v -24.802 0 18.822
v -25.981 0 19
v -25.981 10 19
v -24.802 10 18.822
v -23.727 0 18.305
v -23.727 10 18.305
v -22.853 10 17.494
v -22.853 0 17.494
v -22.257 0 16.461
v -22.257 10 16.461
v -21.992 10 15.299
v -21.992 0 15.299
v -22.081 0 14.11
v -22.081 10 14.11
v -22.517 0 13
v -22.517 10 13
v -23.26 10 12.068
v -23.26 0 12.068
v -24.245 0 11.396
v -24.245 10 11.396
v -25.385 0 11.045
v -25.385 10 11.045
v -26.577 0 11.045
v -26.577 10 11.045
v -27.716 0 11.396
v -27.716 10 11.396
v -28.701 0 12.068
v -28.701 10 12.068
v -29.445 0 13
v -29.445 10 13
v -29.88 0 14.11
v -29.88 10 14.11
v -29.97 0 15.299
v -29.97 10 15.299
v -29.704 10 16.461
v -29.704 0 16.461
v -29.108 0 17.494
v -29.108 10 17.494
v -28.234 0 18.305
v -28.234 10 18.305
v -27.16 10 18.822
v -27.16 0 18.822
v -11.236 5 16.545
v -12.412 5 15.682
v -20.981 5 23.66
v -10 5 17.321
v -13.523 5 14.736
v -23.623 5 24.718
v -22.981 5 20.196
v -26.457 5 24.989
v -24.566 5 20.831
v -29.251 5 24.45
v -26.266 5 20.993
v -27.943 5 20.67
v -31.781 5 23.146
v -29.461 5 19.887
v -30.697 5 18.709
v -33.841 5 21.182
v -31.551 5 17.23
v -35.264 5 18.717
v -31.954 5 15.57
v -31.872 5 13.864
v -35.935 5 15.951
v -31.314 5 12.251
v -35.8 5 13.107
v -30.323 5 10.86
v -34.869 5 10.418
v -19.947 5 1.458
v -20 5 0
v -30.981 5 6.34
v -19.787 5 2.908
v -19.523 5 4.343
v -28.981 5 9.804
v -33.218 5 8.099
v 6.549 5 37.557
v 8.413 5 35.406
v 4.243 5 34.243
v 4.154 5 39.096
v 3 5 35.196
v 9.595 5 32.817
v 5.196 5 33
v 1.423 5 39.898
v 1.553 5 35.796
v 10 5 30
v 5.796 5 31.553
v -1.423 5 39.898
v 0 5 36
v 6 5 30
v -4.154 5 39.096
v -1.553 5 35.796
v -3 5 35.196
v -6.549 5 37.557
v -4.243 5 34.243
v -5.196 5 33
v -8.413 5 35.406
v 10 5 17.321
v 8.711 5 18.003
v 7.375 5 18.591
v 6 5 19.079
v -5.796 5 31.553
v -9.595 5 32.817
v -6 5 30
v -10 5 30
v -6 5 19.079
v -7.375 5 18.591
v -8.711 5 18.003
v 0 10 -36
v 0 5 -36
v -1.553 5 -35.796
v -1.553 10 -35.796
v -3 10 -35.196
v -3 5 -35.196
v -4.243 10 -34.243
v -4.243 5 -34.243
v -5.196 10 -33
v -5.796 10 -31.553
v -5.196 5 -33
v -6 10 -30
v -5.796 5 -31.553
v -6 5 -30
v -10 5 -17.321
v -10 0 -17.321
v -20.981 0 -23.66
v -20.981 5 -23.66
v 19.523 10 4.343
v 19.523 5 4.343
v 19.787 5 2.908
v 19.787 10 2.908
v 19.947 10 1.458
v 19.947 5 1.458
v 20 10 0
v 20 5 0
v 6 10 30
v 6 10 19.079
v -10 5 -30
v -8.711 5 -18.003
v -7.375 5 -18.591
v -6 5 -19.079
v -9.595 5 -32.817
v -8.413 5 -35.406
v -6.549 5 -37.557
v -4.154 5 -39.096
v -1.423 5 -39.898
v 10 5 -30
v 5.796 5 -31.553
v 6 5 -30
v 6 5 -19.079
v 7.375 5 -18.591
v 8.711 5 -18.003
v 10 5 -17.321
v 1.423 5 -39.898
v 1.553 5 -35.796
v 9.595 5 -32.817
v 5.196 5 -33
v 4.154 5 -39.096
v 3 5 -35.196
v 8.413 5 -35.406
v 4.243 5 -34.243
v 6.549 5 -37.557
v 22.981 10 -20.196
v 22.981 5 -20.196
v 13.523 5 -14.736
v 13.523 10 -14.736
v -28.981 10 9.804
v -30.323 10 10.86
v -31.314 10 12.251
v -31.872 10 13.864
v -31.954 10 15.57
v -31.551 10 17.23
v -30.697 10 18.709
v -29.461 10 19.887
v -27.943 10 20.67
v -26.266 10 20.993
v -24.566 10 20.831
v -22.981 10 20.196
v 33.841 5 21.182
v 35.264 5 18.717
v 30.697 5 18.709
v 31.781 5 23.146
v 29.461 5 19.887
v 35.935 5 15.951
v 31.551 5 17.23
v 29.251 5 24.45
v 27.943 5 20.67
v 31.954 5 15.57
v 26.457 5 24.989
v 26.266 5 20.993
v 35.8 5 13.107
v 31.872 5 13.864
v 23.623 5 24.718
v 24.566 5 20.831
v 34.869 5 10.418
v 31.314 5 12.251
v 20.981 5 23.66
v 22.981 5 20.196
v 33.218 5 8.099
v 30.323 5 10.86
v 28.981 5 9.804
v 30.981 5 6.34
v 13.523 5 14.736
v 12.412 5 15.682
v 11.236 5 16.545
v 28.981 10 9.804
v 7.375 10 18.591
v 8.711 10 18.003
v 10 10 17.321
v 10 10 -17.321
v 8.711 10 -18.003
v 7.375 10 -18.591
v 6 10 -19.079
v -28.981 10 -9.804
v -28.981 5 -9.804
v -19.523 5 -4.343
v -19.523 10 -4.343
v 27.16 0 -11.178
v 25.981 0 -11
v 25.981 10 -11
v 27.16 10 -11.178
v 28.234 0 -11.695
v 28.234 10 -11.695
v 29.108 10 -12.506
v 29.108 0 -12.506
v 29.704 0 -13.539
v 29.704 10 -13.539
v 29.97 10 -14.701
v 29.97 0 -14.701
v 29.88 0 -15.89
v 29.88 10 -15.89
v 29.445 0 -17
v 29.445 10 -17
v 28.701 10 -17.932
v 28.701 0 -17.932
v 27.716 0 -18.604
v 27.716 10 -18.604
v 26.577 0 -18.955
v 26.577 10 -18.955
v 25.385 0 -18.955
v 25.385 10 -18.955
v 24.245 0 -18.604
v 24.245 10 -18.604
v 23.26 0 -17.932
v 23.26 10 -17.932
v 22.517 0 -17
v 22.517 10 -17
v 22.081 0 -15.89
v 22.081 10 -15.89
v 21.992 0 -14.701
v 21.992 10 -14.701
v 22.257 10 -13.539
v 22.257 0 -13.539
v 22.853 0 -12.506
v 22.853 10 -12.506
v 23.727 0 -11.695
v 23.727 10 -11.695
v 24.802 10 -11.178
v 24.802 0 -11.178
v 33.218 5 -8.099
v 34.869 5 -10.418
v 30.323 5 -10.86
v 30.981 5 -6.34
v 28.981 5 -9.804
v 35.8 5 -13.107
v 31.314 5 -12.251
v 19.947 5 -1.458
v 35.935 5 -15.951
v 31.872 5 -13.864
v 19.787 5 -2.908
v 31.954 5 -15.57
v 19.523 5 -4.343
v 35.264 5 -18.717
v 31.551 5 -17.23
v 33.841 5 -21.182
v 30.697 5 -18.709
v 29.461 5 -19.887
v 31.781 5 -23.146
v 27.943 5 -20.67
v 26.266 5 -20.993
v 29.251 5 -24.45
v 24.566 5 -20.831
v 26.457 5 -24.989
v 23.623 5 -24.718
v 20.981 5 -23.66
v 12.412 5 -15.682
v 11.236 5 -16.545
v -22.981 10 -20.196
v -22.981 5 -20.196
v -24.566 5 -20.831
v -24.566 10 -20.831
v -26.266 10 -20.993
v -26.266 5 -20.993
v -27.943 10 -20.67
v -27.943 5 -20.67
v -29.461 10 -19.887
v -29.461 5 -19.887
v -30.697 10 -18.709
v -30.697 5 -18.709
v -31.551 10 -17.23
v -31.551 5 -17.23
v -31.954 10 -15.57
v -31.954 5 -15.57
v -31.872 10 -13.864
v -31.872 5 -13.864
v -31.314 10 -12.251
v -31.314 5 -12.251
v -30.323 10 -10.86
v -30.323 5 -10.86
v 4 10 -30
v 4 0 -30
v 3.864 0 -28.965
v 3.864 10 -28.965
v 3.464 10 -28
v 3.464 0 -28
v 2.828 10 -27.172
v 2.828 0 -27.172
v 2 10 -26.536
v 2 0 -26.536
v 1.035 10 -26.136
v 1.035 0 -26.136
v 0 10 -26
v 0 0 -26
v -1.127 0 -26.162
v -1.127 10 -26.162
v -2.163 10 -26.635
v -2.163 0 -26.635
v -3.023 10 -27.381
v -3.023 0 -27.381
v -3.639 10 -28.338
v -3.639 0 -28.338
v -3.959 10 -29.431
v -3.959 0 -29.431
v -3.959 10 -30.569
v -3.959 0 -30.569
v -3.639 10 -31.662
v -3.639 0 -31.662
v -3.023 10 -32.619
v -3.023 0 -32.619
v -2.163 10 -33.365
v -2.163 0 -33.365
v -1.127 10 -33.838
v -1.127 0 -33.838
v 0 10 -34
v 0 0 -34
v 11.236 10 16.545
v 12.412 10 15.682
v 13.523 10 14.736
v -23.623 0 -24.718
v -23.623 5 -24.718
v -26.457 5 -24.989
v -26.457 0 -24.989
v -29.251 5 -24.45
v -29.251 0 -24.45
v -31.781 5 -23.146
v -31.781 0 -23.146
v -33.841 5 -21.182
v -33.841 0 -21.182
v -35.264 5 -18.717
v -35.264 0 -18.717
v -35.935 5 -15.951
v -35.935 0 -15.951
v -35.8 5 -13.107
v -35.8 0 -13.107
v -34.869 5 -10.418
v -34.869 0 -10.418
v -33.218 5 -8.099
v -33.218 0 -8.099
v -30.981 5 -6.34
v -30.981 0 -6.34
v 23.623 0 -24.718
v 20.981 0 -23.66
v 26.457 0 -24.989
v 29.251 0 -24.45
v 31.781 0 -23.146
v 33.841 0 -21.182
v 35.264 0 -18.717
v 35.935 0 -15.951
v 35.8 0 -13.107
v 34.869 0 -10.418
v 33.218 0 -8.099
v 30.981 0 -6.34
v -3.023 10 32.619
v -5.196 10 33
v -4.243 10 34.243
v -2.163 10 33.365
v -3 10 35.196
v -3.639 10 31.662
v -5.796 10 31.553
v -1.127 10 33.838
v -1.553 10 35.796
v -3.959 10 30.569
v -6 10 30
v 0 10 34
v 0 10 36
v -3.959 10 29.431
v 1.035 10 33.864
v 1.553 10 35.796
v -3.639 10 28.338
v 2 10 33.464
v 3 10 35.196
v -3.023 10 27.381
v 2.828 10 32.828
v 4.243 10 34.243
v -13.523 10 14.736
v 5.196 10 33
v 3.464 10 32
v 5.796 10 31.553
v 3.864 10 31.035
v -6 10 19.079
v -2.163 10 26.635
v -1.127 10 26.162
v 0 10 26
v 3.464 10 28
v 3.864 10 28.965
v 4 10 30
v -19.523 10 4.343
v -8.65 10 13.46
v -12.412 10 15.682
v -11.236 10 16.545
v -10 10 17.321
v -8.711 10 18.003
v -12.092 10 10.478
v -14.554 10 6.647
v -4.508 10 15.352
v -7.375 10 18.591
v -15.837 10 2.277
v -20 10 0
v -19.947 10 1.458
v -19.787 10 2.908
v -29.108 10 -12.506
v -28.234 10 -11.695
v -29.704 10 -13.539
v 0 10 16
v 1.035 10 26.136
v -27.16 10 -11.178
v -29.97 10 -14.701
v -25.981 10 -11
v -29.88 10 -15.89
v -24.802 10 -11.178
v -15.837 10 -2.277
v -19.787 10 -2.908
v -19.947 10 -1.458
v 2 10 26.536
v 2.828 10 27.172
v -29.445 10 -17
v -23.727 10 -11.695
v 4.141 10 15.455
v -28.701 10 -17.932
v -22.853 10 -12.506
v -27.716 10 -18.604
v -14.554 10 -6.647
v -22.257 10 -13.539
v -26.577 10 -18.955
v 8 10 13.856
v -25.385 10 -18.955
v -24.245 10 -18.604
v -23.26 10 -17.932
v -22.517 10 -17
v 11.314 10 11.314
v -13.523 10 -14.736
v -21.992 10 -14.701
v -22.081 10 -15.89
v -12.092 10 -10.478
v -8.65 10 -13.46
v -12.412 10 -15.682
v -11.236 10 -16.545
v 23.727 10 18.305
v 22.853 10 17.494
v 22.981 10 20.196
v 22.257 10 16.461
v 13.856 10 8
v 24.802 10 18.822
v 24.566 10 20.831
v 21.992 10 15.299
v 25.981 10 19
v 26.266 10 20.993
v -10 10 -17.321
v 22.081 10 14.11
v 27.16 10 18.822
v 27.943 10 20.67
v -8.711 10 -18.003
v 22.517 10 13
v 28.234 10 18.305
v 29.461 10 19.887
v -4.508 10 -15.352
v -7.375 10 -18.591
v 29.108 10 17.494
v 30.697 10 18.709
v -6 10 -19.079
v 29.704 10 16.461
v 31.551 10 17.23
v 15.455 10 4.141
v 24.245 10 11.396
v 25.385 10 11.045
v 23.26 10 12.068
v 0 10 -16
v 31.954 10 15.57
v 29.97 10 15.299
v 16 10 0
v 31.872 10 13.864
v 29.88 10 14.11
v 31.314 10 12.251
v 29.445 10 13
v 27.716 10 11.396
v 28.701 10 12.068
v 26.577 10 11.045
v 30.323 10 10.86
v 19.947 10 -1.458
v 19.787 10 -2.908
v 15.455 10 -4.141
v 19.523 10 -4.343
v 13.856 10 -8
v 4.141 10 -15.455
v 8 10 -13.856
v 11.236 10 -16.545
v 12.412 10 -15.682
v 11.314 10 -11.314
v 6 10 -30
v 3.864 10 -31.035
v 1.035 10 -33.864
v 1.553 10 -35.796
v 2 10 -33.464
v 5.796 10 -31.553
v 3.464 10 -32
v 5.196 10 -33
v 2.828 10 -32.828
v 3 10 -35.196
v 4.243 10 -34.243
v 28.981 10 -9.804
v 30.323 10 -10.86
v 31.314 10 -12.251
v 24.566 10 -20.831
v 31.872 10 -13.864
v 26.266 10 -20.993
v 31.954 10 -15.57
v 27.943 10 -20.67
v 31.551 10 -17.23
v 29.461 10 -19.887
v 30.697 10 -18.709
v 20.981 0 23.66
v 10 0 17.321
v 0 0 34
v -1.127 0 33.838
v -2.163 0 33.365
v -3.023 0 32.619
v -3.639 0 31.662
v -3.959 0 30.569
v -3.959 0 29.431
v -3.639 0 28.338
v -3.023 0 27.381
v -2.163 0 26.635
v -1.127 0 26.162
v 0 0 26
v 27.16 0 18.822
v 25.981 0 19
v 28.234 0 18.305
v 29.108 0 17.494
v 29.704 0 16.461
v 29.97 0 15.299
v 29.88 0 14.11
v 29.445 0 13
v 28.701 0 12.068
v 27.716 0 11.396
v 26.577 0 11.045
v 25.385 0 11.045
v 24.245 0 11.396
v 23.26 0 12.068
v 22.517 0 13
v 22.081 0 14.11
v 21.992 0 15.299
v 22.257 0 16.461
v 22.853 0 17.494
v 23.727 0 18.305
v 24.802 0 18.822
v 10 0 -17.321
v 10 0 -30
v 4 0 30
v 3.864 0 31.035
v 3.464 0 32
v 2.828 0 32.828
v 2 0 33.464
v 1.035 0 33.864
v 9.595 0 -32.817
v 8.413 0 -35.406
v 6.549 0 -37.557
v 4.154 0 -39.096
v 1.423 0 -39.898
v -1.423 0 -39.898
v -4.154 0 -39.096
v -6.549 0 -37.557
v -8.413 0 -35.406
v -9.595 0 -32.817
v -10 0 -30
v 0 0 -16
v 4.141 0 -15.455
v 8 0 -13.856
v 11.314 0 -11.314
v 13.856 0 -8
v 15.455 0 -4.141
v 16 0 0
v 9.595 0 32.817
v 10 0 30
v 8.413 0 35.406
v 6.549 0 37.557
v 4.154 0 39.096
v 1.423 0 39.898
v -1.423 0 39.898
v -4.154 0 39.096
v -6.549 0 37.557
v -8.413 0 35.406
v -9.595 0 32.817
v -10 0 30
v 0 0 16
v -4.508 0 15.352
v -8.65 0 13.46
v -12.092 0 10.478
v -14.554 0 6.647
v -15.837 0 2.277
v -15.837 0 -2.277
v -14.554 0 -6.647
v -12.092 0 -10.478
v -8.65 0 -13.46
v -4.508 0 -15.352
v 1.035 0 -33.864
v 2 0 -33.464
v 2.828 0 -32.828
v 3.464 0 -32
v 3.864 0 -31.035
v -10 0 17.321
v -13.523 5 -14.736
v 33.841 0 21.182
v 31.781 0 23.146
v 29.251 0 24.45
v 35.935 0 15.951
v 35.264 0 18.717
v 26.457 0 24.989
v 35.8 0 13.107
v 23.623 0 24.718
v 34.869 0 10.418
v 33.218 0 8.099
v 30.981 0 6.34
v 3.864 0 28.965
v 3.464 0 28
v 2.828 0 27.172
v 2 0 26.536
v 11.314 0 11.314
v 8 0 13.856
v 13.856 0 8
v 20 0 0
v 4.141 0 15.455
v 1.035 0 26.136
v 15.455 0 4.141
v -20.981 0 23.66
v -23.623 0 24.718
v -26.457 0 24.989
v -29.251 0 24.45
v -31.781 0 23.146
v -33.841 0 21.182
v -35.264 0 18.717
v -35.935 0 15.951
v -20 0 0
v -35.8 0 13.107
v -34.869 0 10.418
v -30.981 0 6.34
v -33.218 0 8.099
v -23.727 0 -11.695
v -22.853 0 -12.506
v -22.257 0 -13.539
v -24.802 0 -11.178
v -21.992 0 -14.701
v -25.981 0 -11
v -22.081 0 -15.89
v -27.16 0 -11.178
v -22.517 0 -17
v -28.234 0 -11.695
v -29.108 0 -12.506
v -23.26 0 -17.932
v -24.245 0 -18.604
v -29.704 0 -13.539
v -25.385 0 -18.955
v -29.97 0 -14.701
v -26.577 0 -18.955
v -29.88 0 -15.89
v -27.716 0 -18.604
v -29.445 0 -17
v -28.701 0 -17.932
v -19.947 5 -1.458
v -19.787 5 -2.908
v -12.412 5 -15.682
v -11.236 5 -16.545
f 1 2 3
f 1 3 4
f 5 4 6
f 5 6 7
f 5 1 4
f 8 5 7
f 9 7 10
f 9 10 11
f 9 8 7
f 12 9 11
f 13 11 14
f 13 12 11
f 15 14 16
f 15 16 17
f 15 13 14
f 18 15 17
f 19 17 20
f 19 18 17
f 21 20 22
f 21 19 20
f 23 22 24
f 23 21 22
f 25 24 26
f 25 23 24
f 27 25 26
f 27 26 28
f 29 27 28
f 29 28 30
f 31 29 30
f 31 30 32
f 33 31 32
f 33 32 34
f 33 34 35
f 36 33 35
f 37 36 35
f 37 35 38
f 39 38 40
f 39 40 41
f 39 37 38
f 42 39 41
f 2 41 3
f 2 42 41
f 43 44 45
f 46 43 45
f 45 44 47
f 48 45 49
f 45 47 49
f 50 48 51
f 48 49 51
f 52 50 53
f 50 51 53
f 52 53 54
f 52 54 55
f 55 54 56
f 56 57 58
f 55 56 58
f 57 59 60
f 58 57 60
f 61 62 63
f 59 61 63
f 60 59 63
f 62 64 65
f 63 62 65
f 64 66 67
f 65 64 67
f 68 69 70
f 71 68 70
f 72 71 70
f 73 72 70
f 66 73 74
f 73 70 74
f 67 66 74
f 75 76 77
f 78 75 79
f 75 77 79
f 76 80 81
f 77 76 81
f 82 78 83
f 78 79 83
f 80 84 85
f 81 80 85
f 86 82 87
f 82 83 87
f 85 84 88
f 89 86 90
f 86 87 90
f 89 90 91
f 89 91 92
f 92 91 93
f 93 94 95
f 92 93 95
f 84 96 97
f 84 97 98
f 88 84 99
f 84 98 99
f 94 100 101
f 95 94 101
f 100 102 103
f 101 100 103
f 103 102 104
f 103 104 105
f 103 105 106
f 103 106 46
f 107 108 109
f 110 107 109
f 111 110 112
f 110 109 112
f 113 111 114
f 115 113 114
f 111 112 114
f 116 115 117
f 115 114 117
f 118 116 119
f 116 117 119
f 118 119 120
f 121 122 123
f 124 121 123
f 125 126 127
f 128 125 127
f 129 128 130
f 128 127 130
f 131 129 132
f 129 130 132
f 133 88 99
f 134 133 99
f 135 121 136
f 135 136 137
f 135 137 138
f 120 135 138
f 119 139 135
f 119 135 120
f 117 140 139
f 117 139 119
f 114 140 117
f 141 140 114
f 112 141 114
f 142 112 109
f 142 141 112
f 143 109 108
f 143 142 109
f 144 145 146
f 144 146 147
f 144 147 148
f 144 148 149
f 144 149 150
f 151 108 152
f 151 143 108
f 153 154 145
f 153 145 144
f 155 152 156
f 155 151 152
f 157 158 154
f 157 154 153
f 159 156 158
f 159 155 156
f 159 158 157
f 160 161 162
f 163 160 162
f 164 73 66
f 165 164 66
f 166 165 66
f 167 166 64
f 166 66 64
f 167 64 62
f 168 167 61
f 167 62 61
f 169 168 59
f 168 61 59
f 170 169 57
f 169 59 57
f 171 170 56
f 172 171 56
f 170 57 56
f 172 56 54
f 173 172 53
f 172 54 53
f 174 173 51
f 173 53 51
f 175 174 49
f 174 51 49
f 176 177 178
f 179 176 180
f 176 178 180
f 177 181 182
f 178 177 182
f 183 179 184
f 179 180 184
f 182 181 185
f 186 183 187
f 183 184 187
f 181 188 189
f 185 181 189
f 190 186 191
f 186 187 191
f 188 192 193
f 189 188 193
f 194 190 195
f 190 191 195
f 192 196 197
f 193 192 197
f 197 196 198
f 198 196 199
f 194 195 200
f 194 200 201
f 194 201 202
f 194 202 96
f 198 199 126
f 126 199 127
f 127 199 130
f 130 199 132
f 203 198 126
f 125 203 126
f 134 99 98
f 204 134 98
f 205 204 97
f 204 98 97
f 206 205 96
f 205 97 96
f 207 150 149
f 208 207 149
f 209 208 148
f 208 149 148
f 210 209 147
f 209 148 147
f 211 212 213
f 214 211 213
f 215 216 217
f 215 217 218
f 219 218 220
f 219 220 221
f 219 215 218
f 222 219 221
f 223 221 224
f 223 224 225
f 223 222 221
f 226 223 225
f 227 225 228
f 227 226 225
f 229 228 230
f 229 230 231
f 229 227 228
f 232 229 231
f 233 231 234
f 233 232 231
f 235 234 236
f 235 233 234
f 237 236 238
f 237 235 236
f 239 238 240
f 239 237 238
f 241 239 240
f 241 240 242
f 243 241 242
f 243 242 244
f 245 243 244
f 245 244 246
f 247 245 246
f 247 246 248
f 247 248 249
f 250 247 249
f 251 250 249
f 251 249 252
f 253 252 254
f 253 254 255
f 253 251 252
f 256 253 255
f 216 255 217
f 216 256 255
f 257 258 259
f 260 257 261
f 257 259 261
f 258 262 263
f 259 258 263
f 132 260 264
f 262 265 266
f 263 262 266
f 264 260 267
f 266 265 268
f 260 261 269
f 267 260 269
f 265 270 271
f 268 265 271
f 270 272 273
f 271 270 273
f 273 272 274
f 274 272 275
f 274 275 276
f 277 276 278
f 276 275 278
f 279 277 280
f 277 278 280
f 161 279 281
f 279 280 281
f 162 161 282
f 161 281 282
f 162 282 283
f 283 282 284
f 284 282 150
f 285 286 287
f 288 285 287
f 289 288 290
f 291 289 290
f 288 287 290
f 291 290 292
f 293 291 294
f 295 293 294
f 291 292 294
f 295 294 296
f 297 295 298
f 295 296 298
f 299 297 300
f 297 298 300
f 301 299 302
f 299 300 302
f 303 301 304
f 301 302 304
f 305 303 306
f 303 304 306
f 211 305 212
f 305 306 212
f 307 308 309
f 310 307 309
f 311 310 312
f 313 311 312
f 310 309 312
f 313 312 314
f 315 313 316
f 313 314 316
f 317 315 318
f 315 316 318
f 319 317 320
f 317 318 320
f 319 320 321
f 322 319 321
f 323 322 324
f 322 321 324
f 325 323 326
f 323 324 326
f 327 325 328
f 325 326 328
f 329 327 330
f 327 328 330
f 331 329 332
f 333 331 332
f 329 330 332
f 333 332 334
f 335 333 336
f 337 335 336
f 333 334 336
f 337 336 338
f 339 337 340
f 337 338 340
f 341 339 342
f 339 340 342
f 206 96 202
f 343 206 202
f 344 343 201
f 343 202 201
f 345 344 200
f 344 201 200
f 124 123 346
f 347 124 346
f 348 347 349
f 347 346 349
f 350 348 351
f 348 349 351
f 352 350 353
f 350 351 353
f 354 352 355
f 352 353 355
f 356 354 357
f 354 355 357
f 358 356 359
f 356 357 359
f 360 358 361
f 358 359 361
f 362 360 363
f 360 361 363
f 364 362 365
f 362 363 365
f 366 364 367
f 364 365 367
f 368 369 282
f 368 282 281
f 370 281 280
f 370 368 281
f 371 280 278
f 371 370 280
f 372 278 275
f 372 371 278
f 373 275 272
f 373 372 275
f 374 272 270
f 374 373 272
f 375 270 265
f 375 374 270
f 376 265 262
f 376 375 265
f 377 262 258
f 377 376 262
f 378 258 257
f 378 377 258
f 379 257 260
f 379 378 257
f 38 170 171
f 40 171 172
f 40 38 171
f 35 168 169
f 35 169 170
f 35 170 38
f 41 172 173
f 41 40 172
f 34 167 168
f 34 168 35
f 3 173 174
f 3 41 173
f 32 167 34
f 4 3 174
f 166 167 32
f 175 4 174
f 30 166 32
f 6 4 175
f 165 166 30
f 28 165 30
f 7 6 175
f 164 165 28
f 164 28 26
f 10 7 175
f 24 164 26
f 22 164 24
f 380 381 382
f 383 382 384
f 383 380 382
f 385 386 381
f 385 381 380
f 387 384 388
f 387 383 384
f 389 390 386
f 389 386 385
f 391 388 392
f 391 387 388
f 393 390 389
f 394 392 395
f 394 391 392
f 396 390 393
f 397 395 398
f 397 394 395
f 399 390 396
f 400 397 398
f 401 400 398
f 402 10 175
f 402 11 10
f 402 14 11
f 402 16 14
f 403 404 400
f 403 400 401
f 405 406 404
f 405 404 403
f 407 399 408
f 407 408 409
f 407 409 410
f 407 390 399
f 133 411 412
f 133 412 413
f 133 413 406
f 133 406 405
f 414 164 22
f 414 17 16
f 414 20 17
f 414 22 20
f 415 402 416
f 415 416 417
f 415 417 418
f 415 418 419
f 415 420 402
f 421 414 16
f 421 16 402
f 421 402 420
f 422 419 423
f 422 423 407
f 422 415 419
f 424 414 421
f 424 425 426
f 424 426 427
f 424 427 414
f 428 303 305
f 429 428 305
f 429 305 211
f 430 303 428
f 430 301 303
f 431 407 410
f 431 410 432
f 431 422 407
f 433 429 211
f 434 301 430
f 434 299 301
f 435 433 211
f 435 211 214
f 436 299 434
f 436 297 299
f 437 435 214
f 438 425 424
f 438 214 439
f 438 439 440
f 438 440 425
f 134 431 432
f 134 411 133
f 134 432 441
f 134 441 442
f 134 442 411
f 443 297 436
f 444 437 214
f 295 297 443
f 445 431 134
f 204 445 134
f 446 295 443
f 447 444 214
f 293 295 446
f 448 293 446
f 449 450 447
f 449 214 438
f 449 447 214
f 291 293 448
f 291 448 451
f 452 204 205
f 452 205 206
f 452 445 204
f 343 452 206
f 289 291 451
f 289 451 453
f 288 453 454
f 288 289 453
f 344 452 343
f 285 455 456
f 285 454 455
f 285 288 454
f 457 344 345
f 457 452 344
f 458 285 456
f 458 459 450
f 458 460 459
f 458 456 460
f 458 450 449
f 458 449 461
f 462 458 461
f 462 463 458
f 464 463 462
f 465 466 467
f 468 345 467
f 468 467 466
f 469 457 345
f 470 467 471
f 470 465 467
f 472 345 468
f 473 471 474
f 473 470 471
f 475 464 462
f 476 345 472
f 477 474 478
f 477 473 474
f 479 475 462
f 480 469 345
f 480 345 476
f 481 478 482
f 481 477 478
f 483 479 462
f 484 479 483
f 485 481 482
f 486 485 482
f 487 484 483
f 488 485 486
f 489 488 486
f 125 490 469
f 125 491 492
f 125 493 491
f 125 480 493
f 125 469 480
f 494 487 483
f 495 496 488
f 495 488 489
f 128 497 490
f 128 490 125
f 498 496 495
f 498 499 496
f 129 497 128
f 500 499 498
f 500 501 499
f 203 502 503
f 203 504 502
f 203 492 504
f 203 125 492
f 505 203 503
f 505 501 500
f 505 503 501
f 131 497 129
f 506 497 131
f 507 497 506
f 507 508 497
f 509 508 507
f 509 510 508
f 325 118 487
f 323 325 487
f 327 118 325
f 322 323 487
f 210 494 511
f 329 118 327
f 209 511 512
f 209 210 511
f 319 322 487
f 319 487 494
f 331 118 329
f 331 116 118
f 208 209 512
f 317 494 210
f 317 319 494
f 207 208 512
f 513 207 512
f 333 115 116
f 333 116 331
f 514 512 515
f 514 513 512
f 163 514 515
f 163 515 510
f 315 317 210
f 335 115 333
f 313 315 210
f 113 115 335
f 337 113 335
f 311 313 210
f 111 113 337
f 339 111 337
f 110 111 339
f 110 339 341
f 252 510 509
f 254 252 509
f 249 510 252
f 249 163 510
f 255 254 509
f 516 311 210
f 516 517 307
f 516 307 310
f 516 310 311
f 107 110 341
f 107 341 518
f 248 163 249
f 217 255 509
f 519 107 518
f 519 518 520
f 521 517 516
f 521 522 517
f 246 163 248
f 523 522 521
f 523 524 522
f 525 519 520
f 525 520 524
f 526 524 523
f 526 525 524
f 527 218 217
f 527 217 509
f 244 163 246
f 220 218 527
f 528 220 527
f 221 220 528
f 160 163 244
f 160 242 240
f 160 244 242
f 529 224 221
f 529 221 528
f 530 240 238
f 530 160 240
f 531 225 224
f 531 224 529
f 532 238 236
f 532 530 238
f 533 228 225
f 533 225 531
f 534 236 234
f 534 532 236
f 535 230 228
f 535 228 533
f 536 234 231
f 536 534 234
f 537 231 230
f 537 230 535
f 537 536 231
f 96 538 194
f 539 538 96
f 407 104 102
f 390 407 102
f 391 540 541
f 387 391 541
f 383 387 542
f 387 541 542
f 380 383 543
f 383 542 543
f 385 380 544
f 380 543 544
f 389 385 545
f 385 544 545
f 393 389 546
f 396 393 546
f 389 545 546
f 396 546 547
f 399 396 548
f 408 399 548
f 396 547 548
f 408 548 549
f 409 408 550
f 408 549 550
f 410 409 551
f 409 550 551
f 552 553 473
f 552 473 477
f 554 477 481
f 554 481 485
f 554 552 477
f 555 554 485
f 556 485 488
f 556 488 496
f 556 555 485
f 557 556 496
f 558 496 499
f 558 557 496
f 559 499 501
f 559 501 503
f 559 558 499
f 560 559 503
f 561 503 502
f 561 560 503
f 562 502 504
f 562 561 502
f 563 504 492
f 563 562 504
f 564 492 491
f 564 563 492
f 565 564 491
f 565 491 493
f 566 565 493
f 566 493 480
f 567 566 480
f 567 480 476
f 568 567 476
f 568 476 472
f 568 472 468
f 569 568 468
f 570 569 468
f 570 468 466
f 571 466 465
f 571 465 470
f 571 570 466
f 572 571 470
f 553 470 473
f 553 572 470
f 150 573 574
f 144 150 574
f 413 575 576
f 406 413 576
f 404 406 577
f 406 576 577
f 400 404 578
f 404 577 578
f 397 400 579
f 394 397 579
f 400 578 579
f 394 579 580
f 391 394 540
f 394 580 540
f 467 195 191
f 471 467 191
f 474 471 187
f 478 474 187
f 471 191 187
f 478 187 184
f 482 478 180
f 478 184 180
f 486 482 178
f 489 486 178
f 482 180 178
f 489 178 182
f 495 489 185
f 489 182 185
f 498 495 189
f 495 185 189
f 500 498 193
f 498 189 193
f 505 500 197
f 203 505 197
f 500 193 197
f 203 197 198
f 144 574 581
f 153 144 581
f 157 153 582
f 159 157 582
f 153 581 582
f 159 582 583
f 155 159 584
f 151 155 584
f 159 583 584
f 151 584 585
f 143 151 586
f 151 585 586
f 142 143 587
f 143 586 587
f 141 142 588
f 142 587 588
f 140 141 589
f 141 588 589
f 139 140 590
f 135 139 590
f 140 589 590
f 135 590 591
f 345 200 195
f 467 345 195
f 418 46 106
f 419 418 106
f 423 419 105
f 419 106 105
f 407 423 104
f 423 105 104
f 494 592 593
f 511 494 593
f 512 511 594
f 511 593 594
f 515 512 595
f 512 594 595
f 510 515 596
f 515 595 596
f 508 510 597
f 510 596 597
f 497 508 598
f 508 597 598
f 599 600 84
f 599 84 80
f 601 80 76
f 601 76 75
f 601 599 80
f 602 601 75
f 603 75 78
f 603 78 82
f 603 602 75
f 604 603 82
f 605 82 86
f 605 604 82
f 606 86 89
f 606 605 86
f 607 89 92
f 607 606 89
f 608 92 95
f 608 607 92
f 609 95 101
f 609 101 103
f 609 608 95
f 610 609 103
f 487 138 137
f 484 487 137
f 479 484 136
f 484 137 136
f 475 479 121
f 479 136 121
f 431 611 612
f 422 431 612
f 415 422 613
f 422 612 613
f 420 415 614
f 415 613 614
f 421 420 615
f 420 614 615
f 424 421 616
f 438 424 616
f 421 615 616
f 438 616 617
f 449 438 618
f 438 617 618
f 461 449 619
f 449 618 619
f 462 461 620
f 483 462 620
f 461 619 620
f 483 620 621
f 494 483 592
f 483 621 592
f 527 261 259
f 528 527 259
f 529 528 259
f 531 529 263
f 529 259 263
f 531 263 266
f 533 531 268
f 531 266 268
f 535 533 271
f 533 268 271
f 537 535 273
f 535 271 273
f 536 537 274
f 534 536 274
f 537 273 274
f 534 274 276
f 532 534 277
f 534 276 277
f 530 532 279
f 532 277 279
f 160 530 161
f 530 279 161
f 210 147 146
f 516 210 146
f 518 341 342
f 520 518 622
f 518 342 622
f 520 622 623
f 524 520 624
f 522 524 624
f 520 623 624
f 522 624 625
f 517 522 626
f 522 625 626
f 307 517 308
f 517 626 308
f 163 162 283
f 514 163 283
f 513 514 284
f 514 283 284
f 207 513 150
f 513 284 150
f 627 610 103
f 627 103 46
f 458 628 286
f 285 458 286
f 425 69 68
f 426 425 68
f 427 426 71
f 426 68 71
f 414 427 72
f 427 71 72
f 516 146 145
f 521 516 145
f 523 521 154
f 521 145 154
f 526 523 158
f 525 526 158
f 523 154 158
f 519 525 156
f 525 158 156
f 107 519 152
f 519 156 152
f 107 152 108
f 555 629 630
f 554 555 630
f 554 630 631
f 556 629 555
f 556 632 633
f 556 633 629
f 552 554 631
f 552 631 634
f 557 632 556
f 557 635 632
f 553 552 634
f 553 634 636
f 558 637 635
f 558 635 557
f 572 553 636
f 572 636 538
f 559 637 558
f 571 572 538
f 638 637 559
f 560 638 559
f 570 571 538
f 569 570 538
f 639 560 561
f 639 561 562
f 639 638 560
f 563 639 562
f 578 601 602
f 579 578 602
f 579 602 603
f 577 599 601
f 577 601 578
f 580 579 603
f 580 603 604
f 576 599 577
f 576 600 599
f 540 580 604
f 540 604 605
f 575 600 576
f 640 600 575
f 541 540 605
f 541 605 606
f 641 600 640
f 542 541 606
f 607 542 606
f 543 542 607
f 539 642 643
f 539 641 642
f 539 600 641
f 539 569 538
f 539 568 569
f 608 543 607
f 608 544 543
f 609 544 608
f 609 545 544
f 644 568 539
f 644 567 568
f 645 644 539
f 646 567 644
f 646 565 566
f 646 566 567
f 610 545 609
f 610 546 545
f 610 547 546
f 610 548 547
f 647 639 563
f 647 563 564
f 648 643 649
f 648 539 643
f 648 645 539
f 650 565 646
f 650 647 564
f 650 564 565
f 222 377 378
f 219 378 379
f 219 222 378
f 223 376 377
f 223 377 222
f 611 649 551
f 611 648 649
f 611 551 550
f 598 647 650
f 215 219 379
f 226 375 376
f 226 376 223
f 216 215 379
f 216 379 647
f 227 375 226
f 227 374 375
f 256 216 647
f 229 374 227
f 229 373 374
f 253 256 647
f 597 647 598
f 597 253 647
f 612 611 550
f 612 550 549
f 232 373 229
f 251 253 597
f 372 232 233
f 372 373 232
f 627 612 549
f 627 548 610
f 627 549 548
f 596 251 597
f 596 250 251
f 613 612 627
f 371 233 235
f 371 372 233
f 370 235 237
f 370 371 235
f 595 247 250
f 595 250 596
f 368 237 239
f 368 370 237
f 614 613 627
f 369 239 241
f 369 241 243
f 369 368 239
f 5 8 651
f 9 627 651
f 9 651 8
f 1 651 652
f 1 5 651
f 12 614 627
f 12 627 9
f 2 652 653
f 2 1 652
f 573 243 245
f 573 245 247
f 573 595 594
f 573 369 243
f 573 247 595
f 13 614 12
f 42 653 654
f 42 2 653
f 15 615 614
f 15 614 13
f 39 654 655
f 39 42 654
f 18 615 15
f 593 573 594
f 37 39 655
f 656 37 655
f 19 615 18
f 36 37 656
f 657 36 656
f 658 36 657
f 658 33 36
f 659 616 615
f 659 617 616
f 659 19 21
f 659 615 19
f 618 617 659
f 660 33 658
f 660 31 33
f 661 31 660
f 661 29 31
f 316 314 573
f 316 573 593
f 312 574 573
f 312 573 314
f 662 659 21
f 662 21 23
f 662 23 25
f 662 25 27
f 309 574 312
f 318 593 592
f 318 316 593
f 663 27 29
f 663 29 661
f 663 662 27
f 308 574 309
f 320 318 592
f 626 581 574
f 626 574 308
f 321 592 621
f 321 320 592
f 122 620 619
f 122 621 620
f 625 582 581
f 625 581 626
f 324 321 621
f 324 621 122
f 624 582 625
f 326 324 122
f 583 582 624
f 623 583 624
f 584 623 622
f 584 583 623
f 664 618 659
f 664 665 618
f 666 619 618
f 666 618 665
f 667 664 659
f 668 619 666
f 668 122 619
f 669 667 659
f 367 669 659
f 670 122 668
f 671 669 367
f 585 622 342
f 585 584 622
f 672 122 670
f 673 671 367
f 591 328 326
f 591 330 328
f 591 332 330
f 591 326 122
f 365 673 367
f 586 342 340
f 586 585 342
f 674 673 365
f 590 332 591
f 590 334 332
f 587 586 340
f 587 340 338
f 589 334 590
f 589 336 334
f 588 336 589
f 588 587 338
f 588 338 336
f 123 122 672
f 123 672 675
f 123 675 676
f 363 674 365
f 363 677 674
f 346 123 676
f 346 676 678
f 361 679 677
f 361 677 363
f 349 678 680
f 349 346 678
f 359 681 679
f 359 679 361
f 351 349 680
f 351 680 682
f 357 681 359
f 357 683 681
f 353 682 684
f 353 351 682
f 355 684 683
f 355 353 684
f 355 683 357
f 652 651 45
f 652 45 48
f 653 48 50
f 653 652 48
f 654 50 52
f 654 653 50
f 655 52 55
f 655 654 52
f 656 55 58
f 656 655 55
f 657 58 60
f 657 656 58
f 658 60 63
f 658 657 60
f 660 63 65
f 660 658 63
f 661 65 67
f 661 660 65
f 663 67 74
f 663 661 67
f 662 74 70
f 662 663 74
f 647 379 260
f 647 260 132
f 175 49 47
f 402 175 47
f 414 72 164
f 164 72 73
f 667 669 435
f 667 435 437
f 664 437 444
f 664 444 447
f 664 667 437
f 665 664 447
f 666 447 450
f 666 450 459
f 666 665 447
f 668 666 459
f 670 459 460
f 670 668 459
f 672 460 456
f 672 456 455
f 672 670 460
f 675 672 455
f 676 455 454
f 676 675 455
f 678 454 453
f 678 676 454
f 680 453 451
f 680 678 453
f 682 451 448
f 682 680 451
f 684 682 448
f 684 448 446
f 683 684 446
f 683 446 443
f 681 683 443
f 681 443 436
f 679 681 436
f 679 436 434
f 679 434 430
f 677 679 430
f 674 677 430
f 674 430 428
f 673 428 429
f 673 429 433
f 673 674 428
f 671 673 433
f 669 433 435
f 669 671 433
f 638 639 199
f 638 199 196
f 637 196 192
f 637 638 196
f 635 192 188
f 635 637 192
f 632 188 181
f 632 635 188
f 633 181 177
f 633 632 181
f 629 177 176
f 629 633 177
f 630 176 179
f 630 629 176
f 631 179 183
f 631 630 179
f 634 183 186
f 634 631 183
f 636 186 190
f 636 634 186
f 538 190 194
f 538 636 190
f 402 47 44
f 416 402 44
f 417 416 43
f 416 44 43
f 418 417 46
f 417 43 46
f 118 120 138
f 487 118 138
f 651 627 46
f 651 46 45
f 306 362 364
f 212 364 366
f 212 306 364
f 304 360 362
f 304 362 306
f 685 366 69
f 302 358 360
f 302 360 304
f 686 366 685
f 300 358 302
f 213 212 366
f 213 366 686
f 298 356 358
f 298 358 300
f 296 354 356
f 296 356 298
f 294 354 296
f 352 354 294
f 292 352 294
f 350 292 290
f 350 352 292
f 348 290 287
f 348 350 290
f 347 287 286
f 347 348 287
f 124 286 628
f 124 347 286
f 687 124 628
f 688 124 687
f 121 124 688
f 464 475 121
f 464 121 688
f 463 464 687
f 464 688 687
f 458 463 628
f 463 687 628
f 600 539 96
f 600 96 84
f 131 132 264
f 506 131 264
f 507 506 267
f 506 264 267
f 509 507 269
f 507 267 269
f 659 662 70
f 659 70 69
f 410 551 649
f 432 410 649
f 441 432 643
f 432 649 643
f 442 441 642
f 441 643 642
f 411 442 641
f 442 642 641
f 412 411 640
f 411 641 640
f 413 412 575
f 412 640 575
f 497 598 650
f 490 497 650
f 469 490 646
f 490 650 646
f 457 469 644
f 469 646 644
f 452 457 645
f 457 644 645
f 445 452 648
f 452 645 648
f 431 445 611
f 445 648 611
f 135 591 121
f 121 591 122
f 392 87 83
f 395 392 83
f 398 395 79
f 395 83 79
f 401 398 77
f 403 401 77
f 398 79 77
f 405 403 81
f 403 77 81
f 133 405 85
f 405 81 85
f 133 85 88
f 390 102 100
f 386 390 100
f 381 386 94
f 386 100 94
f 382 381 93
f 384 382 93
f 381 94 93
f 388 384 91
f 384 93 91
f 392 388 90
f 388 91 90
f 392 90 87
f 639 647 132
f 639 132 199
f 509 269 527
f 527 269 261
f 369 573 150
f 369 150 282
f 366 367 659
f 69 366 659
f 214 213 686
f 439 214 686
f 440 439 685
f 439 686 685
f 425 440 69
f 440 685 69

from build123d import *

# Parameters (mm, degrees)
SKETCH1_R           = 4
SKETCH1_R_2         = 16
BOSS_EXTRUDE1_DEPTH = 10
BOSS_EXTRUDE2_DEPTH = 5


with BuildPart() as part:
    # Sketch1 → Boss-Extrude1 (new body)
    with BuildSketch(Plane(origin=(0, 0, 0), x_dir=(1, 0, 0), z_dir=(0, 1, 0))):
        with BuildLine():
            ThreePointArc((-6, -30), (0, -36), (6, -30))
            Line((6, -30), (6, -19.078784028))
            ThreePointArc((6, -19.078784028), (10, -17.320508076), (13.522711642, -14.735544437))
            Line((13.522711642, -14.735544437), (22.980762114, -20.196152423))
            ThreePointArc((22.980762114, -20.196152423), (31.176914536, -18), (28.980762114, -9.803847577))
            Line((28.980762114, -9.803847577), (19.522711642, -4.343239591))
            ThreePointArc((19.522711642, -4.343239591), (20, 0), (19.522711642, 4.343239591))
            Line((19.522711642, 4.343239591), (28.980762114, 9.803847577))
            ThreePointArc((28.980762114, 9.803847577), (31.176914536, 18), (22.980762114, 20.196152423))
            Line((22.980762114, 20.196152423), (13.522711642, 14.735544437))
            ThreePointArc((13.522711642, 14.735544437), (10, 17.320508076), (6, 19.078784028))
            Line((6, 19.078784028), (6, 30))
            ThreePointArc((6, 30), (0, 36), (-6, 30))
            Line((-6, 30), (-6, 19.078784028))
            ThreePointArc((-6, 19.078784028), (-10, 17.320508076), (-13.522711642, 14.735544437))
            Line((-13.522711642, 14.735544437), (-22.980762114, 20.196152423))
            ThreePointArc((-22.980762114, 20.196152423), (-31.176914536, 18), (-28.980762114, 9.803847577))
            Line((-28.980762114, 9.803847577), (-19.522711642, 4.343239591))
            ThreePointArc((-19.522711642, 4.343239591), (-20, 0), (-19.522711642, -4.343239591))
            Line((-19.522711642, -4.343239591), (-28.980762114, -9.803847577))
            ThreePointArc((-28.980762114, -9.803847577), (-31.176914536, -18), (-22.980762114, -20.196152423))
            Line((-22.980762114, -20.196152423), (-13.522711642, -14.735544437))
            ThreePointArc((-13.522711642, -14.735544437), (-10, -17.320508076), (-6, -19.078784028))
            Line((-6, -19.078784028), (-6, -30))
        make_face()
        with Locations((0, 30)):
            Circle(SKETCH1_R, mode=Mode.SUBTRACT)
        Circle(SKETCH1_R_2, mode=Mode.SUBTRACT)
        with Locations((0, -30)):
            Circle(SKETCH1_R, mode=Mode.SUBTRACT)
        with Locations((-25.980762114, -15)):
            Circle(SKETCH1_R, mode=Mode.SUBTRACT)
        with Locations((-25.980762114, 15)):
            Circle(SKETCH1_R, mode=Mode.SUBTRACT)
        with Locations((25.980762114, -15)):
            Circle(SKETCH1_R, mode=Mode.SUBTRACT)
        with Locations((25.980762114, 15)):
            Circle(SKETCH1_R, mode=Mode.SUBTRACT)
    extrude(amount=BOSS_EXTRUDE1_DEPTH)

    # Sketch1<5> → Boss-Extrude2 (add)
    with BuildSketch(Plane(origin=(0, 0, 0), x_dir=(1, 0, 0), z_dir=(0, 1, 0))):
        with BuildLine():
            ThreePointArc((10, 30), (0, 40), (-10, 30))
            Line((-10, 30), (-10, 17.320508076))
            ThreePointArc((-10, 17.320508076), (-8.048160261, 18.309208514), (-6, 19.078784028))
            Line((-6, 19.078784028), (-6, 30))
            ThreePointArc((-6, 30), (0, 36), (6, 30))
            Line((6, 30), (6, 19.078784028))
            ThreePointArc((6, 19.078784028), (8.048160261, 18.309208514), (10, 17.320508076))
            Line((10, 17.320508076), (10, 30))
        make_face()
        with BuildLine():
            ThreePointArc((-13.522711642, 14.735544437), (-11.832159566, 16.124515497), (-10, 17.320508076))
            Line((-10, 17.320508076), (-20.980762114, 23.660254038))
            ThreePointArc((-20.980762114, 23.660254038), (-34.641016151, 20), (-30.980762114, 6.339745962))
            Line((-30.980762114, 6.339745962), (-20, 0))
            ThreePointArc((-20, 0), (-19.880319827, 2.184693018), (-19.522711642, 4.343239591))
            Line((-19.522711642, 4.343239591), (-28.980762114, 9.803847577))
            ThreePointArc((-28.980762114, 9.803847577), (-31.176914536, 18), (-22.980762114, 20.196152423))
            Line((-22.980762114, 20.196152423), (-13.522711642, 14.735544437))
        make_face()
        with BuildLine():
            Line((20.980762114, 23.660254038), (10, 17.320508076))
            ThreePointArc((10, 17.320508076), (11.832159566, 16.124515497), (13.522711642, 14.735544437))
            Line((13.522711642, 14.735544437), (22.980762114, 20.196152423))
            ThreePointArc((22.980762114, 20.196152423), (31.176914536, 18), (28.980762114, 9.803847577))
            Line((28.980762114, 9.803847577), (19.522711642, 4.343239591))
            ThreePointArc((19.522711642, 4.343239591), (19.880319827, 2.184693018), (20, 0))
            Line((20, 0), (30.980762114, 6.339745962))
            ThreePointArc((30.980762114, 6.339745962), (34.641016151, 20), (20.980762114, 23.660254038))
        make_face()
        with BuildLine():
            ThreePointArc((-19.522711642, -4.343239591), (-19.880319827, -2.184693018), (-20, 0))
            Line((-20, 0), (-30.980762114, -6.339745962))
            ThreePointArc((-30.980762114, -6.339745962), (-34.641016151, -20), (-20.980762114, -23.660254038))
            Line((-20.980762114, -23.660254038), (-10, -17.320508076))
            ThreePointArc((-10, -17.320508076), (-11.832159566, -16.124515497), (-13.522711642, -14.735544437))
            Line((-13.522711642, -14.735544437), (-22.980762114, -20.196152423))
            ThreePointArc((-22.980762114, -20.196152423), (-31.176914536, -18), (-28.980762114, -9.803847577))
            Line((-28.980762114, -9.803847577), (-19.522711642, -4.343239591))
        make_face()
        with BuildLine():
            Line((30.980762114, -6.339745962), (20, 0))
            ThreePointArc((20, 0), (19.880319827, -2.184693018), (19.522711642, -4.343239591))
            Line((19.522711642, -4.343239591), (28.980762114, -9.803847577))
            ThreePointArc((28.980762114, -9.803847577), (31.176914536, -18), (22.980762114, -20.196152423))
            Line((22.980762114, -20.196152423), (13.522711642, -14.735544437))
            ThreePointArc((13.522711642, -14.735544437), (11.832159566, -16.124515497), (10, -17.320508076))
            Line((10, -17.320508076), (20.980762114, -23.660254038))
            ThreePointArc((20.980762114, -23.660254038), (34.641016151, -20), (30.980762114, -6.339745962))
        make_face()
        with BuildLine():
            ThreePointArc((-6, -19.078784028), (-8.048160261, -18.309208514), (-10, -17.320508076))
            Line((-10, -17.320508076), (-10, -30))
            ThreePointArc((-10, -30), (0, -40), (10, -30))
            Line((10, -30), (10, -17.320508076))
            ThreePointArc((10, -17.320508076), (8.048160261, -18.309208514), (6, -19.078784028))
            Line((6, -19.078784028), (6, -30))
            ThreePointArc((6, -30), (0, -36), (-6, -30))
            Line((-6, -30), (-6, -19.078784028))
        make_face()
    extrude(amount=BOSS_EXTRUDE2_DEPTH)


solid = part.part
